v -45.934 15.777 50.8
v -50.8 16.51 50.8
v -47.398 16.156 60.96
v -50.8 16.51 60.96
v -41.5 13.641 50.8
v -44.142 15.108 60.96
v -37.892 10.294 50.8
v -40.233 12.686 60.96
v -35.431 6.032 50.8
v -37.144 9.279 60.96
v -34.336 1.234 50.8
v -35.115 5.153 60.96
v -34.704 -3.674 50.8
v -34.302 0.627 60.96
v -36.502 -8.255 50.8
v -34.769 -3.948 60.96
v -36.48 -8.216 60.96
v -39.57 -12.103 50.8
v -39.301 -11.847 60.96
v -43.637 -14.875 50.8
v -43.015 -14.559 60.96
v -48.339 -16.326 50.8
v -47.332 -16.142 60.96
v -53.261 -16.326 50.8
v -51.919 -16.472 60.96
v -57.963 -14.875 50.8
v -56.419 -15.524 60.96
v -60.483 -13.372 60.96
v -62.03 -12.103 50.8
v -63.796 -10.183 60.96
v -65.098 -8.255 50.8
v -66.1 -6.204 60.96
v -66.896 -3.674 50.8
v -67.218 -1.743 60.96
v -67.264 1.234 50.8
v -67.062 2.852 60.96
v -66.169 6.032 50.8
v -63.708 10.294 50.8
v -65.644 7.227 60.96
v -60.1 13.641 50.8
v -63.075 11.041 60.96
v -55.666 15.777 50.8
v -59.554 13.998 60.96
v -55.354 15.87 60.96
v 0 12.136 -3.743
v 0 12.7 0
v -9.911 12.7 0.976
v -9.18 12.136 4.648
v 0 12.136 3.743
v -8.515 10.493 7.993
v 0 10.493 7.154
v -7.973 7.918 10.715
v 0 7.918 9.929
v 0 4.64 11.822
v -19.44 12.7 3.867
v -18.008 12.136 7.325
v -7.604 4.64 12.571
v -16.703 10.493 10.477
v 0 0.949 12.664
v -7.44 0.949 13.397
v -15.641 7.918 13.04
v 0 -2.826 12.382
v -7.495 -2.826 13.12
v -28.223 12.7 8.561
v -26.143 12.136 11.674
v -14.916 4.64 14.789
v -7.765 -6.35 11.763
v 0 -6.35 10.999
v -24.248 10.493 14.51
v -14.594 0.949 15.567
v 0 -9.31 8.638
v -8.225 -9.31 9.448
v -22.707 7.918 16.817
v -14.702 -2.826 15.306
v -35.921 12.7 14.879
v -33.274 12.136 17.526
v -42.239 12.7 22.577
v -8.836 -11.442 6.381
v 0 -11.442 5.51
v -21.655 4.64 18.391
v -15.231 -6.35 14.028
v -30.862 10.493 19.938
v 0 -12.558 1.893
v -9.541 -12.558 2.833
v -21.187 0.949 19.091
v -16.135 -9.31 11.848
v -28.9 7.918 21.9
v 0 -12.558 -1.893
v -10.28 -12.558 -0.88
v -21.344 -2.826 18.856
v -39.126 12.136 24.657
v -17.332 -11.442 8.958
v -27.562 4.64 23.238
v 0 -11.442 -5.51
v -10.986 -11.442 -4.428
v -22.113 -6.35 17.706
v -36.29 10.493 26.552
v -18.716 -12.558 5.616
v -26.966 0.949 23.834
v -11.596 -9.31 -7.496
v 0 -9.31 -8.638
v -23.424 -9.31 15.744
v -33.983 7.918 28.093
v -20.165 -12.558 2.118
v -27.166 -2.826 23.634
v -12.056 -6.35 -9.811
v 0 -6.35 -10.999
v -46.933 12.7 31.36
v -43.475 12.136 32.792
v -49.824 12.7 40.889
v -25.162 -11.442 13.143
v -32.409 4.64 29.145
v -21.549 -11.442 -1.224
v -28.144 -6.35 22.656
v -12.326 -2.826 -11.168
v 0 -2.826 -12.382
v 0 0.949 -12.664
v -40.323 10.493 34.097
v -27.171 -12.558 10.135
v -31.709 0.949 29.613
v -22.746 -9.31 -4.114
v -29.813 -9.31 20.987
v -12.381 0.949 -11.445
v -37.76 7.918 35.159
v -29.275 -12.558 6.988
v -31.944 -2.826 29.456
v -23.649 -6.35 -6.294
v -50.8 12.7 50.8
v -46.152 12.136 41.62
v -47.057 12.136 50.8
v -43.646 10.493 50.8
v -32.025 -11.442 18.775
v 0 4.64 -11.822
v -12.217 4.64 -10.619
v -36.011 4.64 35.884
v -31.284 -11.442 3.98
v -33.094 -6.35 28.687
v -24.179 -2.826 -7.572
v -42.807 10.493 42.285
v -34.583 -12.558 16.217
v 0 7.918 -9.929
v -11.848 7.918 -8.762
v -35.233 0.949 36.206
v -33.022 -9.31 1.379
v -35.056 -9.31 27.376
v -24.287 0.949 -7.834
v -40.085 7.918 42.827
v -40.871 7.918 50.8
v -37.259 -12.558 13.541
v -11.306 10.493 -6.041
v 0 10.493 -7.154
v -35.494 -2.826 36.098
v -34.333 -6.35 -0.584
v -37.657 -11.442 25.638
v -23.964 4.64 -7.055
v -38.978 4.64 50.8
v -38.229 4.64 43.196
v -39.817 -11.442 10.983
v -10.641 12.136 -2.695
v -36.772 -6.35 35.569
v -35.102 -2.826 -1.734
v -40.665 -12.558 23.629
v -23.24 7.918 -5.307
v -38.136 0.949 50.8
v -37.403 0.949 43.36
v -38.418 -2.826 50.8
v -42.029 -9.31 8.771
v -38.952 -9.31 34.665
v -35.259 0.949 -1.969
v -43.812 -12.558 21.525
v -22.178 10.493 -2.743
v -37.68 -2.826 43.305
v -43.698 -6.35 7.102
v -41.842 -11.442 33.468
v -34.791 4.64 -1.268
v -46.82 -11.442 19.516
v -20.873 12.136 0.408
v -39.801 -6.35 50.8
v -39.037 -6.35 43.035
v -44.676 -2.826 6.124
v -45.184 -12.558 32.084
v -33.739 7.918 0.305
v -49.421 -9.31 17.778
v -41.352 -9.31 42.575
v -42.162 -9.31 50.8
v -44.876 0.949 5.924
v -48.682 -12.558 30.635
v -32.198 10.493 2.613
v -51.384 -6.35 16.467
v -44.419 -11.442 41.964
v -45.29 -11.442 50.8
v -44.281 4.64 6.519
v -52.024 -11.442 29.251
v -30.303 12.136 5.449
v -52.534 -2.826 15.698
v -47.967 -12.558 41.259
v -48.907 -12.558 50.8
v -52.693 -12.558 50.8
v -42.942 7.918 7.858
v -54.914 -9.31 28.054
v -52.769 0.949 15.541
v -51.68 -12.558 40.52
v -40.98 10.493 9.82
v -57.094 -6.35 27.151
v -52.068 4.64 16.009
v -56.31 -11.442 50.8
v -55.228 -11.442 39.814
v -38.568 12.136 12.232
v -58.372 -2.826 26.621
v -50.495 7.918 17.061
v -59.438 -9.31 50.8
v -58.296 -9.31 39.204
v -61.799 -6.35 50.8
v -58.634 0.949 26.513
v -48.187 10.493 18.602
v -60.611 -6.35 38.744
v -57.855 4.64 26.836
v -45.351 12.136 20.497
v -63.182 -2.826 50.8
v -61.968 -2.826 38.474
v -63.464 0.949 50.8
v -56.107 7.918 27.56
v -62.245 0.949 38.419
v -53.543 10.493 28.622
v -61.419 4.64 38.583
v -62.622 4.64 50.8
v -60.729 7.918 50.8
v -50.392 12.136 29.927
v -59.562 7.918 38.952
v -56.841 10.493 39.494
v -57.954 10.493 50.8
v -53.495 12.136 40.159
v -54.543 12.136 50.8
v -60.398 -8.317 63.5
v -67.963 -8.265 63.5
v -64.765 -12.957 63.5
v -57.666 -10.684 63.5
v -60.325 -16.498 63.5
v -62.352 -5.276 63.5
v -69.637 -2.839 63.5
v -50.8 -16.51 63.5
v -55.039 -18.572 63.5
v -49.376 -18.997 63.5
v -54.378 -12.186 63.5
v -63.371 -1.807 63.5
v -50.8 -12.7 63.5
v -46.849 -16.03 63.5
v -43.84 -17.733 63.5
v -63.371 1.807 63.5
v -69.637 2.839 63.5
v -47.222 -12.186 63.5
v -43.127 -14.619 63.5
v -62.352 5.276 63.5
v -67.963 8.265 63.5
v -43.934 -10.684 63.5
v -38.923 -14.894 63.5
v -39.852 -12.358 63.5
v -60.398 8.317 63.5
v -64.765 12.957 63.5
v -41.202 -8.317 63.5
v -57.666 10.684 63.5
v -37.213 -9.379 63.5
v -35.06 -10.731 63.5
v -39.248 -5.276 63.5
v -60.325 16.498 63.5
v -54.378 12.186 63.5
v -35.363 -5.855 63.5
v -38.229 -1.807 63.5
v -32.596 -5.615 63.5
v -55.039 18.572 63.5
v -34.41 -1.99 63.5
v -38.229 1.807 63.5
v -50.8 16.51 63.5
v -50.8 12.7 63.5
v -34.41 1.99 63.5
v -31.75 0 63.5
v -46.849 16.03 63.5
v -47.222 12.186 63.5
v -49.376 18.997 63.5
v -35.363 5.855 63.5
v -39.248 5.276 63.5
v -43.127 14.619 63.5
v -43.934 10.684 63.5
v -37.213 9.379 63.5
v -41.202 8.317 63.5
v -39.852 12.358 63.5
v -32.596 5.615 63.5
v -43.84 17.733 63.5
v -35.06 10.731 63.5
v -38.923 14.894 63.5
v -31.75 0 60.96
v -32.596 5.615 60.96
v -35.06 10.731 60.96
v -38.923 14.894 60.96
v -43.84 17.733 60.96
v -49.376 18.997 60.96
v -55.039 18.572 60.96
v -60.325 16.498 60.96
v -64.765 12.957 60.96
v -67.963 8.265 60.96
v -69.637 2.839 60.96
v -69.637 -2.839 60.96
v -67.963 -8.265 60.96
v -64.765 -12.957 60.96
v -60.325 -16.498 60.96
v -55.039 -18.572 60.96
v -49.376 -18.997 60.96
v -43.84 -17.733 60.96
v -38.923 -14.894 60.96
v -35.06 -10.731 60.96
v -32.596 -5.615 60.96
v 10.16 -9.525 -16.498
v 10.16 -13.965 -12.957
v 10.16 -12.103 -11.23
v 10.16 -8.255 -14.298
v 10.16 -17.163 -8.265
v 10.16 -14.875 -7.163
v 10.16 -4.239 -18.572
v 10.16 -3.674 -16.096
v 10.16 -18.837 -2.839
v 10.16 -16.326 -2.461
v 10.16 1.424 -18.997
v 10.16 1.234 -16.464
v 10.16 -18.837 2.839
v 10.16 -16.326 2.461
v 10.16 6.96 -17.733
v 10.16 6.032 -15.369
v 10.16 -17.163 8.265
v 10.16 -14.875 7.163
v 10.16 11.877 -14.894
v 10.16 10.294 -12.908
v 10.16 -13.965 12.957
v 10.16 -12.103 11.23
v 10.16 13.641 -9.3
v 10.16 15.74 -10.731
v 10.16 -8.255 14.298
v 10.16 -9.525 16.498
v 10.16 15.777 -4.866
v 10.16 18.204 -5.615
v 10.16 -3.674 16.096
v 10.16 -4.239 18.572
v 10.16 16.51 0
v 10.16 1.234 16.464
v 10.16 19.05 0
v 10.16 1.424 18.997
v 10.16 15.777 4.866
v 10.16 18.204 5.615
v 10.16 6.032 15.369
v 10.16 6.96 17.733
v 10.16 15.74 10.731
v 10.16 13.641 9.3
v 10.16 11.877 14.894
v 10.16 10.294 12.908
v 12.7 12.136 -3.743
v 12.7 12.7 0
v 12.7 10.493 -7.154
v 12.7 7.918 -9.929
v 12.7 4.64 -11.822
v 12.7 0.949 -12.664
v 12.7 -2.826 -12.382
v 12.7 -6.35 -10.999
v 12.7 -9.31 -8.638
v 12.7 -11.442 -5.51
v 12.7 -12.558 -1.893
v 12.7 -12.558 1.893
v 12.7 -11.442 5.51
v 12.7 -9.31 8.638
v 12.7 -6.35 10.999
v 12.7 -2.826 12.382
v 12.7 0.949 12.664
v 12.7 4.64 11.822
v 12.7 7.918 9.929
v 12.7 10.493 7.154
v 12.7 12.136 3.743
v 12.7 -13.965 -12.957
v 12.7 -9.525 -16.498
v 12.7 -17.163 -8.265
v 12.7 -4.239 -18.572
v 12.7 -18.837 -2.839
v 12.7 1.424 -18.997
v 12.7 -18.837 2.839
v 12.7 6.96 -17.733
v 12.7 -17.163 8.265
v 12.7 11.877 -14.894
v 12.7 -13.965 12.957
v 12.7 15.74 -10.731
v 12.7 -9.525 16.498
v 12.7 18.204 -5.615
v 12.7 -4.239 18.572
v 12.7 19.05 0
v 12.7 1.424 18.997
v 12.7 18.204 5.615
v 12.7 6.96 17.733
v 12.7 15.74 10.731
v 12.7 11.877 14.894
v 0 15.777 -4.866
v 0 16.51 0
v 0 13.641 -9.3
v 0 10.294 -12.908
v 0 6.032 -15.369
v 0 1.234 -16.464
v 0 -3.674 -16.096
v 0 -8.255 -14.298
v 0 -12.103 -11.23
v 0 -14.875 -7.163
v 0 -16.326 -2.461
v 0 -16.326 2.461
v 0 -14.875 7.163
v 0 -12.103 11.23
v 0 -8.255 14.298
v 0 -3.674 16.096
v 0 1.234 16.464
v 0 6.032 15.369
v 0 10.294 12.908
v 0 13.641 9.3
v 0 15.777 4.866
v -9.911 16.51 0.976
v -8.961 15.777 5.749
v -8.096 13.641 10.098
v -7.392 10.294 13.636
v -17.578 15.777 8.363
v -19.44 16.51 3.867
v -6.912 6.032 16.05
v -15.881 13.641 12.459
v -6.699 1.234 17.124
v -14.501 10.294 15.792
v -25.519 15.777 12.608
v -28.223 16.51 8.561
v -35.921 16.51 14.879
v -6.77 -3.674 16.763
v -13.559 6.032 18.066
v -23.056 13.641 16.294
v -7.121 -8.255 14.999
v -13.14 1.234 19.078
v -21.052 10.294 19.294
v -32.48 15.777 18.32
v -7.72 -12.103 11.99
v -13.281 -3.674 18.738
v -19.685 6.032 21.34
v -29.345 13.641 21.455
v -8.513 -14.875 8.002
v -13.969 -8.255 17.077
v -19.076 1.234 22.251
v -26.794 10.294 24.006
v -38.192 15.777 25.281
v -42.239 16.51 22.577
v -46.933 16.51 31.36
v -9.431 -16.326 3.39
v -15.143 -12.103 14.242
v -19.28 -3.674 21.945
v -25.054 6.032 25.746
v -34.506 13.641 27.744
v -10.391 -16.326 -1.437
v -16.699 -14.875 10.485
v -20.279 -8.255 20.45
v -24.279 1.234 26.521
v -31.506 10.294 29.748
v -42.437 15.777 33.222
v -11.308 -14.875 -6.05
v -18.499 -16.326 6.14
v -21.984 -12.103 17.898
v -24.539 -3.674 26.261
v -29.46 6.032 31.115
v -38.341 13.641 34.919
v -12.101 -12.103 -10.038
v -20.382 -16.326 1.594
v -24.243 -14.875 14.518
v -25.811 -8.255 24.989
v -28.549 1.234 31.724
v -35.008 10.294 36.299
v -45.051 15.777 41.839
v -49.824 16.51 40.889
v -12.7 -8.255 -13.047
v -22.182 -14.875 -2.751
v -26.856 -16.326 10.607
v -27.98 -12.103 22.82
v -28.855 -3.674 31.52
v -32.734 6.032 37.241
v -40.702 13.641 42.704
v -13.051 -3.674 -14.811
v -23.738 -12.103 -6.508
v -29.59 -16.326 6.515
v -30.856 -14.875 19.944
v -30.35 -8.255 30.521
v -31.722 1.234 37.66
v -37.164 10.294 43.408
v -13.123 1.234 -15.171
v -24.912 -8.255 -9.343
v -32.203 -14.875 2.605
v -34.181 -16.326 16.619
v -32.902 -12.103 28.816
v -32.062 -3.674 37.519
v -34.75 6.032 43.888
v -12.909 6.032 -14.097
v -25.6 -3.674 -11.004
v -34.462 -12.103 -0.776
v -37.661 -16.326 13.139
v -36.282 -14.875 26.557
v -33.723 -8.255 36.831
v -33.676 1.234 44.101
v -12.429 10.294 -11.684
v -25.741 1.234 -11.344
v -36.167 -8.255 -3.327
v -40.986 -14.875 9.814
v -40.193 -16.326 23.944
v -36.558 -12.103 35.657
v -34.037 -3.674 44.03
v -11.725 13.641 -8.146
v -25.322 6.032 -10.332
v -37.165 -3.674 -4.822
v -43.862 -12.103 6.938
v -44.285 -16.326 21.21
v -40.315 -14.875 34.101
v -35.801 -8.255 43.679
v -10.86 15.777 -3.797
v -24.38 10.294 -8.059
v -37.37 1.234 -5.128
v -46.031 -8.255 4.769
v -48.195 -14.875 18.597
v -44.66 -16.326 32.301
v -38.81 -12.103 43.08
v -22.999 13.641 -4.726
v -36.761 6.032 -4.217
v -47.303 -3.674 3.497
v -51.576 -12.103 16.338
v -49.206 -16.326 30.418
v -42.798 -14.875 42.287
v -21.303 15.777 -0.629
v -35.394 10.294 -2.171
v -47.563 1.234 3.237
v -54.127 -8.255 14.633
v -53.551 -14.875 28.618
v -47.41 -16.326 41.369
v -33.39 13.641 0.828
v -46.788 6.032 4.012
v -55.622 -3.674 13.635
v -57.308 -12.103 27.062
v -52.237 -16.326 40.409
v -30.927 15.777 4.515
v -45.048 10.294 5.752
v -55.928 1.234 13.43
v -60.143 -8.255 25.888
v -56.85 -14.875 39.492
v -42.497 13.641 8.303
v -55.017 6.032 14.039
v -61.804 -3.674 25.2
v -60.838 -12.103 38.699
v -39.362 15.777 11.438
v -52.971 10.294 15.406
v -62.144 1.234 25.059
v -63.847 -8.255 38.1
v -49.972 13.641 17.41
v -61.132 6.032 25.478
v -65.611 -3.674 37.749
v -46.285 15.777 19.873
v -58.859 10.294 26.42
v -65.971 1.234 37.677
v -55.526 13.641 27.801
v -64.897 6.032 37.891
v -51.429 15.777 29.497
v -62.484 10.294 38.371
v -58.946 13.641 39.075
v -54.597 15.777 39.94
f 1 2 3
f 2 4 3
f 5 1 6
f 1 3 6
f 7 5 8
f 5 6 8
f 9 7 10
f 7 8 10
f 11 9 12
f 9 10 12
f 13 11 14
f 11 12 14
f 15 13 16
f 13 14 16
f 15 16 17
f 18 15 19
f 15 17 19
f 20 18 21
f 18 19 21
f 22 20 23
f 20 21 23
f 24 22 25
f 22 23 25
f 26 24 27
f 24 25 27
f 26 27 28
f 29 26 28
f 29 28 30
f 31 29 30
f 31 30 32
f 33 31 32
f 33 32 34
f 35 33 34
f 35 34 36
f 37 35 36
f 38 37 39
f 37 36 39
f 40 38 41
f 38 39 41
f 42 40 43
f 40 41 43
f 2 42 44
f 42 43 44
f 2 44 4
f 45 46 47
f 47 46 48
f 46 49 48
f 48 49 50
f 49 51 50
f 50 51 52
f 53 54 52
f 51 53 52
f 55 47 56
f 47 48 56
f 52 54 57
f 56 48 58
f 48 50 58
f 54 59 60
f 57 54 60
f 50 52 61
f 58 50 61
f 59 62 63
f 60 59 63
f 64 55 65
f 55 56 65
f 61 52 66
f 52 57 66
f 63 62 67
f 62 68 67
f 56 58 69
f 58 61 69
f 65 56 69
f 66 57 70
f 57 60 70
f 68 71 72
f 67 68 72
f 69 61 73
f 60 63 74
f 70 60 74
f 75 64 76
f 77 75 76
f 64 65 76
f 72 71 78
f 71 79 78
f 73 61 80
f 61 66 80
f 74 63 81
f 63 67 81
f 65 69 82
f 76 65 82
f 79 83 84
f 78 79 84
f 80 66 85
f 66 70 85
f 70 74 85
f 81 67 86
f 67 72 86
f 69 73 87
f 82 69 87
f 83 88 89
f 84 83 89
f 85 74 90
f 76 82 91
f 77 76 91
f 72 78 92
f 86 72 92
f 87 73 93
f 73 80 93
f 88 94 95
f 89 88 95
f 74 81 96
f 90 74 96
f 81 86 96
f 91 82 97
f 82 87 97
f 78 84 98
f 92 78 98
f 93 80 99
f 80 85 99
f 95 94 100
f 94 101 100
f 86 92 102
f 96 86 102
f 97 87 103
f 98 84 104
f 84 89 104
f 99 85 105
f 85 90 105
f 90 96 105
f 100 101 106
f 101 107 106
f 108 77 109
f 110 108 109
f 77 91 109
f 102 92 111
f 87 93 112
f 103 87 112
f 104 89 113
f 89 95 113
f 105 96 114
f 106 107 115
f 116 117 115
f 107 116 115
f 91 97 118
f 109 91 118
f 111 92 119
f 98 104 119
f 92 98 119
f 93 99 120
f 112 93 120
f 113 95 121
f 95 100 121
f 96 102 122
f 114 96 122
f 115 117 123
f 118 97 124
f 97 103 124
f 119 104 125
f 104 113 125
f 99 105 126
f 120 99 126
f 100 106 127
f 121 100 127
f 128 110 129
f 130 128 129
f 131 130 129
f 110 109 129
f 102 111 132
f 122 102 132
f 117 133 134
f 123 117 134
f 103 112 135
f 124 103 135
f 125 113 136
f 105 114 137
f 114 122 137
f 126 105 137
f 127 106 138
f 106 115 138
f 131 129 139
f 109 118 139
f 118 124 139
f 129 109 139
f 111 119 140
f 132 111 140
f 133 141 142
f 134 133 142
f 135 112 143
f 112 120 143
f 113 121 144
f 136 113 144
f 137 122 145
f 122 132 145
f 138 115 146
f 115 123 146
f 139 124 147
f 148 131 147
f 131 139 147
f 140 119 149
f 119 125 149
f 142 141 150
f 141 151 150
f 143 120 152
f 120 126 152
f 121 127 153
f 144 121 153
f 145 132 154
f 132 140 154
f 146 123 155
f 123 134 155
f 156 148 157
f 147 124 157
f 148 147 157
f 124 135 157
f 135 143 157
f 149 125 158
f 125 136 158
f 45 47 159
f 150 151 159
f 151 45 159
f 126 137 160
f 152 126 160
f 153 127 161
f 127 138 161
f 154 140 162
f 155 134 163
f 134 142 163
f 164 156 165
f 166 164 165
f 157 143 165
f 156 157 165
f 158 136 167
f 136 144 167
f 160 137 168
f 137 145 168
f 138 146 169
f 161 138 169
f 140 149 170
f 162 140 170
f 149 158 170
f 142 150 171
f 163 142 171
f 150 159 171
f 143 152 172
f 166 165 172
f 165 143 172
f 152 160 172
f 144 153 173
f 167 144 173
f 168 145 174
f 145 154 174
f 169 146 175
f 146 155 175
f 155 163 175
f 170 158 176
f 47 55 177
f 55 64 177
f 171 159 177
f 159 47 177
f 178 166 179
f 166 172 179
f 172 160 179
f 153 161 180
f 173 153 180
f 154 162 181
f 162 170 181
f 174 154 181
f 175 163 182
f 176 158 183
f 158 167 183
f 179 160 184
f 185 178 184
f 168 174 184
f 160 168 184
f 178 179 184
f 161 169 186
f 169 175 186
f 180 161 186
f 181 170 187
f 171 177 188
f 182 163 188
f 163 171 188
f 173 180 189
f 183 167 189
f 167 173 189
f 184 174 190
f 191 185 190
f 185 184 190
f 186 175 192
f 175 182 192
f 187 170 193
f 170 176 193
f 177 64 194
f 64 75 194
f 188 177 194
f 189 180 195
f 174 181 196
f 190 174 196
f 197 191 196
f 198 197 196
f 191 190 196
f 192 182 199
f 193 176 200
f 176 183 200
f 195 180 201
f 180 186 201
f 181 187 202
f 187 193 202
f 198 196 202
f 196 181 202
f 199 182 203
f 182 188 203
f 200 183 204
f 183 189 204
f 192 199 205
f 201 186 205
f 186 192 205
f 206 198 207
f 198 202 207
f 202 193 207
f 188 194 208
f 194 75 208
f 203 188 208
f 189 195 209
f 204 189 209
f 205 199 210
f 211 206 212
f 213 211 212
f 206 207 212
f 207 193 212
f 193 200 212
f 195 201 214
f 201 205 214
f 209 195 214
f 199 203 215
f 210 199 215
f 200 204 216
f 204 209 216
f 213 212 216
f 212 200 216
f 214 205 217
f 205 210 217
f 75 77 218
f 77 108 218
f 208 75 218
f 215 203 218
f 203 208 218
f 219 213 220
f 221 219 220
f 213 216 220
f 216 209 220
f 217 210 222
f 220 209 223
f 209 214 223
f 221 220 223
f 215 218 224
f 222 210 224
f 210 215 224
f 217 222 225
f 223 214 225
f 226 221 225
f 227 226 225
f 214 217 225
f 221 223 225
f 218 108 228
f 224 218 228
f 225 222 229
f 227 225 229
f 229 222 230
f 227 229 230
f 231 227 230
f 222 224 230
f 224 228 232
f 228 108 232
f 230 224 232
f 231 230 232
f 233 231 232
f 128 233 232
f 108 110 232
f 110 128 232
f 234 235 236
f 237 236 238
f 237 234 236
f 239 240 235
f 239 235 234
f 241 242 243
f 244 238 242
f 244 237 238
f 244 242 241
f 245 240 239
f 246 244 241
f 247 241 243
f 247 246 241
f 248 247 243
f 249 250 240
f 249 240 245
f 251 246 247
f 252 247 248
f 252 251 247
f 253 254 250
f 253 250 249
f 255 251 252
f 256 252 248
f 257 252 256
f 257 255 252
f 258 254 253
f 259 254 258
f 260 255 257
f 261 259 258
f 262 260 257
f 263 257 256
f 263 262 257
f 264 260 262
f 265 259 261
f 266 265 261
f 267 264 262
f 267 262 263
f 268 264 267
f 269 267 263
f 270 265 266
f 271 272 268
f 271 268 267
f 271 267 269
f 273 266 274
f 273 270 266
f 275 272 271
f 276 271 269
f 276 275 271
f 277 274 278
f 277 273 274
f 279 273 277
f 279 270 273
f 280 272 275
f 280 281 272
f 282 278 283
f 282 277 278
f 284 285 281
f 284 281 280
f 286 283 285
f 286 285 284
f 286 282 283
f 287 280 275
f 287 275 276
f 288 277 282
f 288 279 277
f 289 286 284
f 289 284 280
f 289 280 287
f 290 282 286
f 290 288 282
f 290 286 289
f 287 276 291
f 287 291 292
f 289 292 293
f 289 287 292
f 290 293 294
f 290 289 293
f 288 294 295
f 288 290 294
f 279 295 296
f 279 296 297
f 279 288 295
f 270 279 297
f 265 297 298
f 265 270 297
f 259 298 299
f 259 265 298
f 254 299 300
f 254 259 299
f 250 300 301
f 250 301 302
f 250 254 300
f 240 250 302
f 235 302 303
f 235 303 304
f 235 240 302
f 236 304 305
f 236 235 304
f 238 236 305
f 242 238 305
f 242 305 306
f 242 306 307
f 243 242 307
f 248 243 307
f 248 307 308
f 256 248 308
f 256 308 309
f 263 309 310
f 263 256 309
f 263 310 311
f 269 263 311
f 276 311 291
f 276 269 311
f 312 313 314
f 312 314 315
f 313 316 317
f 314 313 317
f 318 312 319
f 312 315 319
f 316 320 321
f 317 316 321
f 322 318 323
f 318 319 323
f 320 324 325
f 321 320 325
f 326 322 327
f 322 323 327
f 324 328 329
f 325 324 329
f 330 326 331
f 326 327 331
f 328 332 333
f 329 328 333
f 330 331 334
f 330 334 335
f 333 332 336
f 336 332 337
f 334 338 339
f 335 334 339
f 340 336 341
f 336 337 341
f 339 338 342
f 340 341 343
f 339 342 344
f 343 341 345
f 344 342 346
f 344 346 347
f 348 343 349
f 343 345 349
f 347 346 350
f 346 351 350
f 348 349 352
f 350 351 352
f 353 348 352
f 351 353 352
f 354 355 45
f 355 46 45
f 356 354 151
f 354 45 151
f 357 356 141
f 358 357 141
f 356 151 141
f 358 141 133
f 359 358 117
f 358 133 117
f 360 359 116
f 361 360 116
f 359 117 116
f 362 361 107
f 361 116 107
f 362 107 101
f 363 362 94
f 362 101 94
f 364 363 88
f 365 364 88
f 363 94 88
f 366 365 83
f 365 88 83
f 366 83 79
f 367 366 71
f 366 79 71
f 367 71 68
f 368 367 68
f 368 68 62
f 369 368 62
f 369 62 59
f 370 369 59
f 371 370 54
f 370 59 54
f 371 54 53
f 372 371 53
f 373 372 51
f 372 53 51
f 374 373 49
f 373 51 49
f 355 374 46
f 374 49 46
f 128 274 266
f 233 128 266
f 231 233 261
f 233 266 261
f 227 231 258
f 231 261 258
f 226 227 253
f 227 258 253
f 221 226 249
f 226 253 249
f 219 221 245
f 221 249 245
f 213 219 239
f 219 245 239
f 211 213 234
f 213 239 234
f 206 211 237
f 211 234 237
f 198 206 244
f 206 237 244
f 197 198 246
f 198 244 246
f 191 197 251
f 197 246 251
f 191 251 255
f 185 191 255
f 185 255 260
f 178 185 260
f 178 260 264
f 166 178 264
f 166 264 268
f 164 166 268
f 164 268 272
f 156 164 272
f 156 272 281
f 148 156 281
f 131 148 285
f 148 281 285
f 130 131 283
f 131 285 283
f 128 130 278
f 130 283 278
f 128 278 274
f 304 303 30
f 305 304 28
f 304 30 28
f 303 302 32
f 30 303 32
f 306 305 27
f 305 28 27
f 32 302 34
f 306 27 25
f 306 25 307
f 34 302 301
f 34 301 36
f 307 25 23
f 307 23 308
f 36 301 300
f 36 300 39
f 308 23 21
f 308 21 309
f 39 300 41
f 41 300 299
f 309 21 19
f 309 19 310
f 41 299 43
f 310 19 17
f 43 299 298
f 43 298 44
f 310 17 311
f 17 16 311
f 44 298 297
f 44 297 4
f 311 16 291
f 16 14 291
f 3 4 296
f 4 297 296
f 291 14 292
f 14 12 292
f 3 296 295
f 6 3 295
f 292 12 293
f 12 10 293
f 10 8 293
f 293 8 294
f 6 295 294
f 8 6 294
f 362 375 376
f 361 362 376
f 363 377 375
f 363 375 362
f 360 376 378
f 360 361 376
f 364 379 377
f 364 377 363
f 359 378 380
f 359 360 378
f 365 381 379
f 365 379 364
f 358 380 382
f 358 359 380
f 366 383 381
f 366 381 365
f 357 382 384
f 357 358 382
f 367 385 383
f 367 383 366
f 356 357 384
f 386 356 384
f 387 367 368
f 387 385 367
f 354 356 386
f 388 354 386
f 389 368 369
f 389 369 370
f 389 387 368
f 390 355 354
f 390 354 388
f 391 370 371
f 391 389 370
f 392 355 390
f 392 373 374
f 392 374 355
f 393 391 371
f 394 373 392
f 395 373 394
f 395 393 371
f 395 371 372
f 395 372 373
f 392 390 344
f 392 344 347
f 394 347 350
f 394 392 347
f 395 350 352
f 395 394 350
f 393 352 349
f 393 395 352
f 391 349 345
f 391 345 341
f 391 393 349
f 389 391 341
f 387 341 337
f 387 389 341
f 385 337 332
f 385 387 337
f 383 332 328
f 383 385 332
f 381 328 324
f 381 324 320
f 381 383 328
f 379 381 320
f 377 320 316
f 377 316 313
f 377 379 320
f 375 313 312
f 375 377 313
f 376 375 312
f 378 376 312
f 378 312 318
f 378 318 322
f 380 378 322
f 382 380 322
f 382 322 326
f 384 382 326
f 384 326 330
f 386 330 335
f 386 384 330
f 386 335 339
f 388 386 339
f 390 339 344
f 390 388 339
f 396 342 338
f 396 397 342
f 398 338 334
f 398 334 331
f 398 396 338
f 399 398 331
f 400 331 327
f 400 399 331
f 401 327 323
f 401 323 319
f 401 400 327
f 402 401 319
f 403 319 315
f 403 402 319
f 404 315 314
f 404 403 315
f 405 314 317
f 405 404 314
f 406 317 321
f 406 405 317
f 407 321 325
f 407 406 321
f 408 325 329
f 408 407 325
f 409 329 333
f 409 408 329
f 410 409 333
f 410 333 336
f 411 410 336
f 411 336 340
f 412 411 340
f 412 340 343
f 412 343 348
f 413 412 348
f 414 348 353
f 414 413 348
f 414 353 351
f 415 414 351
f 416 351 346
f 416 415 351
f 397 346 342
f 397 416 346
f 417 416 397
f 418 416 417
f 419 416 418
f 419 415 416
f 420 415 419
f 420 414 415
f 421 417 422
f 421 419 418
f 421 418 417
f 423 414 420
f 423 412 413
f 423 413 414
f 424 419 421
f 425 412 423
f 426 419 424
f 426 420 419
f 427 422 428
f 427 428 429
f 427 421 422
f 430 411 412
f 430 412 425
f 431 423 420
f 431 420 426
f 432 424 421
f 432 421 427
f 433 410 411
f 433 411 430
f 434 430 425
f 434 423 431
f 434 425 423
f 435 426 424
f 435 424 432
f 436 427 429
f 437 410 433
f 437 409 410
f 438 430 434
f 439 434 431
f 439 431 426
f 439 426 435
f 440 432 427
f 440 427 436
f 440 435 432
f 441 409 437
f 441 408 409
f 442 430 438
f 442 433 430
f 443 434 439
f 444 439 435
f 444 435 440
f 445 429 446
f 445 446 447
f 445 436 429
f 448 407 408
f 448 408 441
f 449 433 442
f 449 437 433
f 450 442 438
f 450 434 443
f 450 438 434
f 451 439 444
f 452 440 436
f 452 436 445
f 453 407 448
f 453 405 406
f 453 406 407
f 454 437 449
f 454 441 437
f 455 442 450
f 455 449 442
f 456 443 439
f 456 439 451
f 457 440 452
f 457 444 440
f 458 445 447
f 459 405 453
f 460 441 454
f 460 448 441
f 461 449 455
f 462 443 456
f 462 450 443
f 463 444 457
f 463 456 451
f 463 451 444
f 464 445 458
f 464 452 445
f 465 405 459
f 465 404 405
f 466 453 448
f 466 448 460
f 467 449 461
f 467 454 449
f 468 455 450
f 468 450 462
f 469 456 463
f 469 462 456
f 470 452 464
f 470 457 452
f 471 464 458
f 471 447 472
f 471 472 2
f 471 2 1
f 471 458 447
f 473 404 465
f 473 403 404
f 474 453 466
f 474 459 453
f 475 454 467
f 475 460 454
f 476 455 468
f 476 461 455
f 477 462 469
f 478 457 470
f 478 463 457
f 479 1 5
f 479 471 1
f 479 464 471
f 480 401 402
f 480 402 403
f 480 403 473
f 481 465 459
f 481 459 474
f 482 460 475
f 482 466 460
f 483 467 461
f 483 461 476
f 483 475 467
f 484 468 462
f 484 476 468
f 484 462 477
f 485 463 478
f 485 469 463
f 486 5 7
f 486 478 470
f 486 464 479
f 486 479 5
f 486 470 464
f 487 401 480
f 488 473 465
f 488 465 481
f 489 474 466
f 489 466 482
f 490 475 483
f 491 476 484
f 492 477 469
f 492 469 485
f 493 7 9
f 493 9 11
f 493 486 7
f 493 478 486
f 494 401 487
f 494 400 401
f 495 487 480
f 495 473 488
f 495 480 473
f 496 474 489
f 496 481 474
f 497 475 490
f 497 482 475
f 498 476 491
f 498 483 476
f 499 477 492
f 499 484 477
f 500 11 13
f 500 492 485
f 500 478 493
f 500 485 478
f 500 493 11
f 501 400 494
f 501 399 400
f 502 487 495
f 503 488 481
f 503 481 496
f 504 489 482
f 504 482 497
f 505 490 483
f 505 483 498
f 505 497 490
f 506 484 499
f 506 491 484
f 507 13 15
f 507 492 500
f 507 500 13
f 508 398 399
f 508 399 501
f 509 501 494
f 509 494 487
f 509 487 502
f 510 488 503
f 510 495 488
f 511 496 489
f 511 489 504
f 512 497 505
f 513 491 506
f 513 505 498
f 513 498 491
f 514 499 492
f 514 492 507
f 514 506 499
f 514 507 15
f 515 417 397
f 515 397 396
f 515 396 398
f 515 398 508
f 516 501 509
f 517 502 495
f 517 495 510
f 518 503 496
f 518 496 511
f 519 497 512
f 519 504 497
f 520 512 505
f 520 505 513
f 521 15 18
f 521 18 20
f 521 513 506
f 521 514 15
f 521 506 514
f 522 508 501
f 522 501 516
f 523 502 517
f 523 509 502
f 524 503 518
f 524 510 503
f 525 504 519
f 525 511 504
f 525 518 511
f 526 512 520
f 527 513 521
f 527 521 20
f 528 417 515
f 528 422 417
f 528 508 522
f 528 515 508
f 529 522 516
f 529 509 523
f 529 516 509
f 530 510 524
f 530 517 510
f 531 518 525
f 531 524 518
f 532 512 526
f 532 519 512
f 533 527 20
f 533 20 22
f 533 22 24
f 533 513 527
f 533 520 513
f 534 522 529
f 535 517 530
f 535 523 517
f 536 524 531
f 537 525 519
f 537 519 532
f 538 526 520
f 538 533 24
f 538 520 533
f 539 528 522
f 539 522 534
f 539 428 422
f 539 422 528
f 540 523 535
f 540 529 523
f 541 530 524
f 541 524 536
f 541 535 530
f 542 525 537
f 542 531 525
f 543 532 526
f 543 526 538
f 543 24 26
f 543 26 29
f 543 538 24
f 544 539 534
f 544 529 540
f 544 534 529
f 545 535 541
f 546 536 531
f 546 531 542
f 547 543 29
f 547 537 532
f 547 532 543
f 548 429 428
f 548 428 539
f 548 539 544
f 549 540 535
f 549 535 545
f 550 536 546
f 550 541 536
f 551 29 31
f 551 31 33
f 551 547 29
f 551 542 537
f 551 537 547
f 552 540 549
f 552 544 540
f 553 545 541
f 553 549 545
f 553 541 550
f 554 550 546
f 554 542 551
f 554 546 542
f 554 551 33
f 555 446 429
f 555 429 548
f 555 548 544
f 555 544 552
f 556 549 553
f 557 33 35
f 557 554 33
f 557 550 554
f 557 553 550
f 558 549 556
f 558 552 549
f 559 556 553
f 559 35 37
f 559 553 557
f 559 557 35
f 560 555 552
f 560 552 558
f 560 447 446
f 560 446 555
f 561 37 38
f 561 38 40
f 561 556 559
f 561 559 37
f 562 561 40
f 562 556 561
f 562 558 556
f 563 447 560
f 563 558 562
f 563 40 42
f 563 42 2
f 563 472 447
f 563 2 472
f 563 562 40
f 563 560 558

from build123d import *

# Parameters (mm, degrees)
F2_R     = 16.51
F2_R_2   = 12.7
F4_R     = 19.05
F4_R_2   = 12.7
F5_DEPTH = 2.54
F6_R     = 19.05
F6_R_2   = 12.7
F7_DEPTH = 2.54


with BuildPart() as f3:
    # F3: sweep along a path in F0
    with BuildLine(Plane.XZ) as f3_path:
        Line((12.7, 0), (0, 0))
        ThreePointArc((0, 0), (-35.921024, 14.878976), (-50.8, 50.8))
        Line((-50.8, 50.8), (-50.8, 63.5))
    # F2 (on offset) → F3 (sweep)
    with BuildSketch(Plane.YZ.offset(12.7)):
        Circle(F2_R)
        Circle(F2_R_2, mode=Mode.SUBTRACT)
    sweep(path=f3_path.line)

    # F4 (on face) → F5 (join)
    with BuildSketch(Plane.YZ.offset(12.7)):
        Circle(F4_R)
        Circle(F4_R_2, mode=Mode.SUBTRACT)
    extrude(amount=-F5_DEPTH)

    # F6 (on face) → F7 (join)
    with BuildSketch(Plane.XY.offset(63.5)):
        with Locations((-50.8, 0)):
            Circle(F6_R)
        with Locations((-50.8, 0)):
            Circle(F6_R_2, mode=Mode.SUBTRACT)
    extrude(amount=-F7_DEPTH)


solid = f3.part
